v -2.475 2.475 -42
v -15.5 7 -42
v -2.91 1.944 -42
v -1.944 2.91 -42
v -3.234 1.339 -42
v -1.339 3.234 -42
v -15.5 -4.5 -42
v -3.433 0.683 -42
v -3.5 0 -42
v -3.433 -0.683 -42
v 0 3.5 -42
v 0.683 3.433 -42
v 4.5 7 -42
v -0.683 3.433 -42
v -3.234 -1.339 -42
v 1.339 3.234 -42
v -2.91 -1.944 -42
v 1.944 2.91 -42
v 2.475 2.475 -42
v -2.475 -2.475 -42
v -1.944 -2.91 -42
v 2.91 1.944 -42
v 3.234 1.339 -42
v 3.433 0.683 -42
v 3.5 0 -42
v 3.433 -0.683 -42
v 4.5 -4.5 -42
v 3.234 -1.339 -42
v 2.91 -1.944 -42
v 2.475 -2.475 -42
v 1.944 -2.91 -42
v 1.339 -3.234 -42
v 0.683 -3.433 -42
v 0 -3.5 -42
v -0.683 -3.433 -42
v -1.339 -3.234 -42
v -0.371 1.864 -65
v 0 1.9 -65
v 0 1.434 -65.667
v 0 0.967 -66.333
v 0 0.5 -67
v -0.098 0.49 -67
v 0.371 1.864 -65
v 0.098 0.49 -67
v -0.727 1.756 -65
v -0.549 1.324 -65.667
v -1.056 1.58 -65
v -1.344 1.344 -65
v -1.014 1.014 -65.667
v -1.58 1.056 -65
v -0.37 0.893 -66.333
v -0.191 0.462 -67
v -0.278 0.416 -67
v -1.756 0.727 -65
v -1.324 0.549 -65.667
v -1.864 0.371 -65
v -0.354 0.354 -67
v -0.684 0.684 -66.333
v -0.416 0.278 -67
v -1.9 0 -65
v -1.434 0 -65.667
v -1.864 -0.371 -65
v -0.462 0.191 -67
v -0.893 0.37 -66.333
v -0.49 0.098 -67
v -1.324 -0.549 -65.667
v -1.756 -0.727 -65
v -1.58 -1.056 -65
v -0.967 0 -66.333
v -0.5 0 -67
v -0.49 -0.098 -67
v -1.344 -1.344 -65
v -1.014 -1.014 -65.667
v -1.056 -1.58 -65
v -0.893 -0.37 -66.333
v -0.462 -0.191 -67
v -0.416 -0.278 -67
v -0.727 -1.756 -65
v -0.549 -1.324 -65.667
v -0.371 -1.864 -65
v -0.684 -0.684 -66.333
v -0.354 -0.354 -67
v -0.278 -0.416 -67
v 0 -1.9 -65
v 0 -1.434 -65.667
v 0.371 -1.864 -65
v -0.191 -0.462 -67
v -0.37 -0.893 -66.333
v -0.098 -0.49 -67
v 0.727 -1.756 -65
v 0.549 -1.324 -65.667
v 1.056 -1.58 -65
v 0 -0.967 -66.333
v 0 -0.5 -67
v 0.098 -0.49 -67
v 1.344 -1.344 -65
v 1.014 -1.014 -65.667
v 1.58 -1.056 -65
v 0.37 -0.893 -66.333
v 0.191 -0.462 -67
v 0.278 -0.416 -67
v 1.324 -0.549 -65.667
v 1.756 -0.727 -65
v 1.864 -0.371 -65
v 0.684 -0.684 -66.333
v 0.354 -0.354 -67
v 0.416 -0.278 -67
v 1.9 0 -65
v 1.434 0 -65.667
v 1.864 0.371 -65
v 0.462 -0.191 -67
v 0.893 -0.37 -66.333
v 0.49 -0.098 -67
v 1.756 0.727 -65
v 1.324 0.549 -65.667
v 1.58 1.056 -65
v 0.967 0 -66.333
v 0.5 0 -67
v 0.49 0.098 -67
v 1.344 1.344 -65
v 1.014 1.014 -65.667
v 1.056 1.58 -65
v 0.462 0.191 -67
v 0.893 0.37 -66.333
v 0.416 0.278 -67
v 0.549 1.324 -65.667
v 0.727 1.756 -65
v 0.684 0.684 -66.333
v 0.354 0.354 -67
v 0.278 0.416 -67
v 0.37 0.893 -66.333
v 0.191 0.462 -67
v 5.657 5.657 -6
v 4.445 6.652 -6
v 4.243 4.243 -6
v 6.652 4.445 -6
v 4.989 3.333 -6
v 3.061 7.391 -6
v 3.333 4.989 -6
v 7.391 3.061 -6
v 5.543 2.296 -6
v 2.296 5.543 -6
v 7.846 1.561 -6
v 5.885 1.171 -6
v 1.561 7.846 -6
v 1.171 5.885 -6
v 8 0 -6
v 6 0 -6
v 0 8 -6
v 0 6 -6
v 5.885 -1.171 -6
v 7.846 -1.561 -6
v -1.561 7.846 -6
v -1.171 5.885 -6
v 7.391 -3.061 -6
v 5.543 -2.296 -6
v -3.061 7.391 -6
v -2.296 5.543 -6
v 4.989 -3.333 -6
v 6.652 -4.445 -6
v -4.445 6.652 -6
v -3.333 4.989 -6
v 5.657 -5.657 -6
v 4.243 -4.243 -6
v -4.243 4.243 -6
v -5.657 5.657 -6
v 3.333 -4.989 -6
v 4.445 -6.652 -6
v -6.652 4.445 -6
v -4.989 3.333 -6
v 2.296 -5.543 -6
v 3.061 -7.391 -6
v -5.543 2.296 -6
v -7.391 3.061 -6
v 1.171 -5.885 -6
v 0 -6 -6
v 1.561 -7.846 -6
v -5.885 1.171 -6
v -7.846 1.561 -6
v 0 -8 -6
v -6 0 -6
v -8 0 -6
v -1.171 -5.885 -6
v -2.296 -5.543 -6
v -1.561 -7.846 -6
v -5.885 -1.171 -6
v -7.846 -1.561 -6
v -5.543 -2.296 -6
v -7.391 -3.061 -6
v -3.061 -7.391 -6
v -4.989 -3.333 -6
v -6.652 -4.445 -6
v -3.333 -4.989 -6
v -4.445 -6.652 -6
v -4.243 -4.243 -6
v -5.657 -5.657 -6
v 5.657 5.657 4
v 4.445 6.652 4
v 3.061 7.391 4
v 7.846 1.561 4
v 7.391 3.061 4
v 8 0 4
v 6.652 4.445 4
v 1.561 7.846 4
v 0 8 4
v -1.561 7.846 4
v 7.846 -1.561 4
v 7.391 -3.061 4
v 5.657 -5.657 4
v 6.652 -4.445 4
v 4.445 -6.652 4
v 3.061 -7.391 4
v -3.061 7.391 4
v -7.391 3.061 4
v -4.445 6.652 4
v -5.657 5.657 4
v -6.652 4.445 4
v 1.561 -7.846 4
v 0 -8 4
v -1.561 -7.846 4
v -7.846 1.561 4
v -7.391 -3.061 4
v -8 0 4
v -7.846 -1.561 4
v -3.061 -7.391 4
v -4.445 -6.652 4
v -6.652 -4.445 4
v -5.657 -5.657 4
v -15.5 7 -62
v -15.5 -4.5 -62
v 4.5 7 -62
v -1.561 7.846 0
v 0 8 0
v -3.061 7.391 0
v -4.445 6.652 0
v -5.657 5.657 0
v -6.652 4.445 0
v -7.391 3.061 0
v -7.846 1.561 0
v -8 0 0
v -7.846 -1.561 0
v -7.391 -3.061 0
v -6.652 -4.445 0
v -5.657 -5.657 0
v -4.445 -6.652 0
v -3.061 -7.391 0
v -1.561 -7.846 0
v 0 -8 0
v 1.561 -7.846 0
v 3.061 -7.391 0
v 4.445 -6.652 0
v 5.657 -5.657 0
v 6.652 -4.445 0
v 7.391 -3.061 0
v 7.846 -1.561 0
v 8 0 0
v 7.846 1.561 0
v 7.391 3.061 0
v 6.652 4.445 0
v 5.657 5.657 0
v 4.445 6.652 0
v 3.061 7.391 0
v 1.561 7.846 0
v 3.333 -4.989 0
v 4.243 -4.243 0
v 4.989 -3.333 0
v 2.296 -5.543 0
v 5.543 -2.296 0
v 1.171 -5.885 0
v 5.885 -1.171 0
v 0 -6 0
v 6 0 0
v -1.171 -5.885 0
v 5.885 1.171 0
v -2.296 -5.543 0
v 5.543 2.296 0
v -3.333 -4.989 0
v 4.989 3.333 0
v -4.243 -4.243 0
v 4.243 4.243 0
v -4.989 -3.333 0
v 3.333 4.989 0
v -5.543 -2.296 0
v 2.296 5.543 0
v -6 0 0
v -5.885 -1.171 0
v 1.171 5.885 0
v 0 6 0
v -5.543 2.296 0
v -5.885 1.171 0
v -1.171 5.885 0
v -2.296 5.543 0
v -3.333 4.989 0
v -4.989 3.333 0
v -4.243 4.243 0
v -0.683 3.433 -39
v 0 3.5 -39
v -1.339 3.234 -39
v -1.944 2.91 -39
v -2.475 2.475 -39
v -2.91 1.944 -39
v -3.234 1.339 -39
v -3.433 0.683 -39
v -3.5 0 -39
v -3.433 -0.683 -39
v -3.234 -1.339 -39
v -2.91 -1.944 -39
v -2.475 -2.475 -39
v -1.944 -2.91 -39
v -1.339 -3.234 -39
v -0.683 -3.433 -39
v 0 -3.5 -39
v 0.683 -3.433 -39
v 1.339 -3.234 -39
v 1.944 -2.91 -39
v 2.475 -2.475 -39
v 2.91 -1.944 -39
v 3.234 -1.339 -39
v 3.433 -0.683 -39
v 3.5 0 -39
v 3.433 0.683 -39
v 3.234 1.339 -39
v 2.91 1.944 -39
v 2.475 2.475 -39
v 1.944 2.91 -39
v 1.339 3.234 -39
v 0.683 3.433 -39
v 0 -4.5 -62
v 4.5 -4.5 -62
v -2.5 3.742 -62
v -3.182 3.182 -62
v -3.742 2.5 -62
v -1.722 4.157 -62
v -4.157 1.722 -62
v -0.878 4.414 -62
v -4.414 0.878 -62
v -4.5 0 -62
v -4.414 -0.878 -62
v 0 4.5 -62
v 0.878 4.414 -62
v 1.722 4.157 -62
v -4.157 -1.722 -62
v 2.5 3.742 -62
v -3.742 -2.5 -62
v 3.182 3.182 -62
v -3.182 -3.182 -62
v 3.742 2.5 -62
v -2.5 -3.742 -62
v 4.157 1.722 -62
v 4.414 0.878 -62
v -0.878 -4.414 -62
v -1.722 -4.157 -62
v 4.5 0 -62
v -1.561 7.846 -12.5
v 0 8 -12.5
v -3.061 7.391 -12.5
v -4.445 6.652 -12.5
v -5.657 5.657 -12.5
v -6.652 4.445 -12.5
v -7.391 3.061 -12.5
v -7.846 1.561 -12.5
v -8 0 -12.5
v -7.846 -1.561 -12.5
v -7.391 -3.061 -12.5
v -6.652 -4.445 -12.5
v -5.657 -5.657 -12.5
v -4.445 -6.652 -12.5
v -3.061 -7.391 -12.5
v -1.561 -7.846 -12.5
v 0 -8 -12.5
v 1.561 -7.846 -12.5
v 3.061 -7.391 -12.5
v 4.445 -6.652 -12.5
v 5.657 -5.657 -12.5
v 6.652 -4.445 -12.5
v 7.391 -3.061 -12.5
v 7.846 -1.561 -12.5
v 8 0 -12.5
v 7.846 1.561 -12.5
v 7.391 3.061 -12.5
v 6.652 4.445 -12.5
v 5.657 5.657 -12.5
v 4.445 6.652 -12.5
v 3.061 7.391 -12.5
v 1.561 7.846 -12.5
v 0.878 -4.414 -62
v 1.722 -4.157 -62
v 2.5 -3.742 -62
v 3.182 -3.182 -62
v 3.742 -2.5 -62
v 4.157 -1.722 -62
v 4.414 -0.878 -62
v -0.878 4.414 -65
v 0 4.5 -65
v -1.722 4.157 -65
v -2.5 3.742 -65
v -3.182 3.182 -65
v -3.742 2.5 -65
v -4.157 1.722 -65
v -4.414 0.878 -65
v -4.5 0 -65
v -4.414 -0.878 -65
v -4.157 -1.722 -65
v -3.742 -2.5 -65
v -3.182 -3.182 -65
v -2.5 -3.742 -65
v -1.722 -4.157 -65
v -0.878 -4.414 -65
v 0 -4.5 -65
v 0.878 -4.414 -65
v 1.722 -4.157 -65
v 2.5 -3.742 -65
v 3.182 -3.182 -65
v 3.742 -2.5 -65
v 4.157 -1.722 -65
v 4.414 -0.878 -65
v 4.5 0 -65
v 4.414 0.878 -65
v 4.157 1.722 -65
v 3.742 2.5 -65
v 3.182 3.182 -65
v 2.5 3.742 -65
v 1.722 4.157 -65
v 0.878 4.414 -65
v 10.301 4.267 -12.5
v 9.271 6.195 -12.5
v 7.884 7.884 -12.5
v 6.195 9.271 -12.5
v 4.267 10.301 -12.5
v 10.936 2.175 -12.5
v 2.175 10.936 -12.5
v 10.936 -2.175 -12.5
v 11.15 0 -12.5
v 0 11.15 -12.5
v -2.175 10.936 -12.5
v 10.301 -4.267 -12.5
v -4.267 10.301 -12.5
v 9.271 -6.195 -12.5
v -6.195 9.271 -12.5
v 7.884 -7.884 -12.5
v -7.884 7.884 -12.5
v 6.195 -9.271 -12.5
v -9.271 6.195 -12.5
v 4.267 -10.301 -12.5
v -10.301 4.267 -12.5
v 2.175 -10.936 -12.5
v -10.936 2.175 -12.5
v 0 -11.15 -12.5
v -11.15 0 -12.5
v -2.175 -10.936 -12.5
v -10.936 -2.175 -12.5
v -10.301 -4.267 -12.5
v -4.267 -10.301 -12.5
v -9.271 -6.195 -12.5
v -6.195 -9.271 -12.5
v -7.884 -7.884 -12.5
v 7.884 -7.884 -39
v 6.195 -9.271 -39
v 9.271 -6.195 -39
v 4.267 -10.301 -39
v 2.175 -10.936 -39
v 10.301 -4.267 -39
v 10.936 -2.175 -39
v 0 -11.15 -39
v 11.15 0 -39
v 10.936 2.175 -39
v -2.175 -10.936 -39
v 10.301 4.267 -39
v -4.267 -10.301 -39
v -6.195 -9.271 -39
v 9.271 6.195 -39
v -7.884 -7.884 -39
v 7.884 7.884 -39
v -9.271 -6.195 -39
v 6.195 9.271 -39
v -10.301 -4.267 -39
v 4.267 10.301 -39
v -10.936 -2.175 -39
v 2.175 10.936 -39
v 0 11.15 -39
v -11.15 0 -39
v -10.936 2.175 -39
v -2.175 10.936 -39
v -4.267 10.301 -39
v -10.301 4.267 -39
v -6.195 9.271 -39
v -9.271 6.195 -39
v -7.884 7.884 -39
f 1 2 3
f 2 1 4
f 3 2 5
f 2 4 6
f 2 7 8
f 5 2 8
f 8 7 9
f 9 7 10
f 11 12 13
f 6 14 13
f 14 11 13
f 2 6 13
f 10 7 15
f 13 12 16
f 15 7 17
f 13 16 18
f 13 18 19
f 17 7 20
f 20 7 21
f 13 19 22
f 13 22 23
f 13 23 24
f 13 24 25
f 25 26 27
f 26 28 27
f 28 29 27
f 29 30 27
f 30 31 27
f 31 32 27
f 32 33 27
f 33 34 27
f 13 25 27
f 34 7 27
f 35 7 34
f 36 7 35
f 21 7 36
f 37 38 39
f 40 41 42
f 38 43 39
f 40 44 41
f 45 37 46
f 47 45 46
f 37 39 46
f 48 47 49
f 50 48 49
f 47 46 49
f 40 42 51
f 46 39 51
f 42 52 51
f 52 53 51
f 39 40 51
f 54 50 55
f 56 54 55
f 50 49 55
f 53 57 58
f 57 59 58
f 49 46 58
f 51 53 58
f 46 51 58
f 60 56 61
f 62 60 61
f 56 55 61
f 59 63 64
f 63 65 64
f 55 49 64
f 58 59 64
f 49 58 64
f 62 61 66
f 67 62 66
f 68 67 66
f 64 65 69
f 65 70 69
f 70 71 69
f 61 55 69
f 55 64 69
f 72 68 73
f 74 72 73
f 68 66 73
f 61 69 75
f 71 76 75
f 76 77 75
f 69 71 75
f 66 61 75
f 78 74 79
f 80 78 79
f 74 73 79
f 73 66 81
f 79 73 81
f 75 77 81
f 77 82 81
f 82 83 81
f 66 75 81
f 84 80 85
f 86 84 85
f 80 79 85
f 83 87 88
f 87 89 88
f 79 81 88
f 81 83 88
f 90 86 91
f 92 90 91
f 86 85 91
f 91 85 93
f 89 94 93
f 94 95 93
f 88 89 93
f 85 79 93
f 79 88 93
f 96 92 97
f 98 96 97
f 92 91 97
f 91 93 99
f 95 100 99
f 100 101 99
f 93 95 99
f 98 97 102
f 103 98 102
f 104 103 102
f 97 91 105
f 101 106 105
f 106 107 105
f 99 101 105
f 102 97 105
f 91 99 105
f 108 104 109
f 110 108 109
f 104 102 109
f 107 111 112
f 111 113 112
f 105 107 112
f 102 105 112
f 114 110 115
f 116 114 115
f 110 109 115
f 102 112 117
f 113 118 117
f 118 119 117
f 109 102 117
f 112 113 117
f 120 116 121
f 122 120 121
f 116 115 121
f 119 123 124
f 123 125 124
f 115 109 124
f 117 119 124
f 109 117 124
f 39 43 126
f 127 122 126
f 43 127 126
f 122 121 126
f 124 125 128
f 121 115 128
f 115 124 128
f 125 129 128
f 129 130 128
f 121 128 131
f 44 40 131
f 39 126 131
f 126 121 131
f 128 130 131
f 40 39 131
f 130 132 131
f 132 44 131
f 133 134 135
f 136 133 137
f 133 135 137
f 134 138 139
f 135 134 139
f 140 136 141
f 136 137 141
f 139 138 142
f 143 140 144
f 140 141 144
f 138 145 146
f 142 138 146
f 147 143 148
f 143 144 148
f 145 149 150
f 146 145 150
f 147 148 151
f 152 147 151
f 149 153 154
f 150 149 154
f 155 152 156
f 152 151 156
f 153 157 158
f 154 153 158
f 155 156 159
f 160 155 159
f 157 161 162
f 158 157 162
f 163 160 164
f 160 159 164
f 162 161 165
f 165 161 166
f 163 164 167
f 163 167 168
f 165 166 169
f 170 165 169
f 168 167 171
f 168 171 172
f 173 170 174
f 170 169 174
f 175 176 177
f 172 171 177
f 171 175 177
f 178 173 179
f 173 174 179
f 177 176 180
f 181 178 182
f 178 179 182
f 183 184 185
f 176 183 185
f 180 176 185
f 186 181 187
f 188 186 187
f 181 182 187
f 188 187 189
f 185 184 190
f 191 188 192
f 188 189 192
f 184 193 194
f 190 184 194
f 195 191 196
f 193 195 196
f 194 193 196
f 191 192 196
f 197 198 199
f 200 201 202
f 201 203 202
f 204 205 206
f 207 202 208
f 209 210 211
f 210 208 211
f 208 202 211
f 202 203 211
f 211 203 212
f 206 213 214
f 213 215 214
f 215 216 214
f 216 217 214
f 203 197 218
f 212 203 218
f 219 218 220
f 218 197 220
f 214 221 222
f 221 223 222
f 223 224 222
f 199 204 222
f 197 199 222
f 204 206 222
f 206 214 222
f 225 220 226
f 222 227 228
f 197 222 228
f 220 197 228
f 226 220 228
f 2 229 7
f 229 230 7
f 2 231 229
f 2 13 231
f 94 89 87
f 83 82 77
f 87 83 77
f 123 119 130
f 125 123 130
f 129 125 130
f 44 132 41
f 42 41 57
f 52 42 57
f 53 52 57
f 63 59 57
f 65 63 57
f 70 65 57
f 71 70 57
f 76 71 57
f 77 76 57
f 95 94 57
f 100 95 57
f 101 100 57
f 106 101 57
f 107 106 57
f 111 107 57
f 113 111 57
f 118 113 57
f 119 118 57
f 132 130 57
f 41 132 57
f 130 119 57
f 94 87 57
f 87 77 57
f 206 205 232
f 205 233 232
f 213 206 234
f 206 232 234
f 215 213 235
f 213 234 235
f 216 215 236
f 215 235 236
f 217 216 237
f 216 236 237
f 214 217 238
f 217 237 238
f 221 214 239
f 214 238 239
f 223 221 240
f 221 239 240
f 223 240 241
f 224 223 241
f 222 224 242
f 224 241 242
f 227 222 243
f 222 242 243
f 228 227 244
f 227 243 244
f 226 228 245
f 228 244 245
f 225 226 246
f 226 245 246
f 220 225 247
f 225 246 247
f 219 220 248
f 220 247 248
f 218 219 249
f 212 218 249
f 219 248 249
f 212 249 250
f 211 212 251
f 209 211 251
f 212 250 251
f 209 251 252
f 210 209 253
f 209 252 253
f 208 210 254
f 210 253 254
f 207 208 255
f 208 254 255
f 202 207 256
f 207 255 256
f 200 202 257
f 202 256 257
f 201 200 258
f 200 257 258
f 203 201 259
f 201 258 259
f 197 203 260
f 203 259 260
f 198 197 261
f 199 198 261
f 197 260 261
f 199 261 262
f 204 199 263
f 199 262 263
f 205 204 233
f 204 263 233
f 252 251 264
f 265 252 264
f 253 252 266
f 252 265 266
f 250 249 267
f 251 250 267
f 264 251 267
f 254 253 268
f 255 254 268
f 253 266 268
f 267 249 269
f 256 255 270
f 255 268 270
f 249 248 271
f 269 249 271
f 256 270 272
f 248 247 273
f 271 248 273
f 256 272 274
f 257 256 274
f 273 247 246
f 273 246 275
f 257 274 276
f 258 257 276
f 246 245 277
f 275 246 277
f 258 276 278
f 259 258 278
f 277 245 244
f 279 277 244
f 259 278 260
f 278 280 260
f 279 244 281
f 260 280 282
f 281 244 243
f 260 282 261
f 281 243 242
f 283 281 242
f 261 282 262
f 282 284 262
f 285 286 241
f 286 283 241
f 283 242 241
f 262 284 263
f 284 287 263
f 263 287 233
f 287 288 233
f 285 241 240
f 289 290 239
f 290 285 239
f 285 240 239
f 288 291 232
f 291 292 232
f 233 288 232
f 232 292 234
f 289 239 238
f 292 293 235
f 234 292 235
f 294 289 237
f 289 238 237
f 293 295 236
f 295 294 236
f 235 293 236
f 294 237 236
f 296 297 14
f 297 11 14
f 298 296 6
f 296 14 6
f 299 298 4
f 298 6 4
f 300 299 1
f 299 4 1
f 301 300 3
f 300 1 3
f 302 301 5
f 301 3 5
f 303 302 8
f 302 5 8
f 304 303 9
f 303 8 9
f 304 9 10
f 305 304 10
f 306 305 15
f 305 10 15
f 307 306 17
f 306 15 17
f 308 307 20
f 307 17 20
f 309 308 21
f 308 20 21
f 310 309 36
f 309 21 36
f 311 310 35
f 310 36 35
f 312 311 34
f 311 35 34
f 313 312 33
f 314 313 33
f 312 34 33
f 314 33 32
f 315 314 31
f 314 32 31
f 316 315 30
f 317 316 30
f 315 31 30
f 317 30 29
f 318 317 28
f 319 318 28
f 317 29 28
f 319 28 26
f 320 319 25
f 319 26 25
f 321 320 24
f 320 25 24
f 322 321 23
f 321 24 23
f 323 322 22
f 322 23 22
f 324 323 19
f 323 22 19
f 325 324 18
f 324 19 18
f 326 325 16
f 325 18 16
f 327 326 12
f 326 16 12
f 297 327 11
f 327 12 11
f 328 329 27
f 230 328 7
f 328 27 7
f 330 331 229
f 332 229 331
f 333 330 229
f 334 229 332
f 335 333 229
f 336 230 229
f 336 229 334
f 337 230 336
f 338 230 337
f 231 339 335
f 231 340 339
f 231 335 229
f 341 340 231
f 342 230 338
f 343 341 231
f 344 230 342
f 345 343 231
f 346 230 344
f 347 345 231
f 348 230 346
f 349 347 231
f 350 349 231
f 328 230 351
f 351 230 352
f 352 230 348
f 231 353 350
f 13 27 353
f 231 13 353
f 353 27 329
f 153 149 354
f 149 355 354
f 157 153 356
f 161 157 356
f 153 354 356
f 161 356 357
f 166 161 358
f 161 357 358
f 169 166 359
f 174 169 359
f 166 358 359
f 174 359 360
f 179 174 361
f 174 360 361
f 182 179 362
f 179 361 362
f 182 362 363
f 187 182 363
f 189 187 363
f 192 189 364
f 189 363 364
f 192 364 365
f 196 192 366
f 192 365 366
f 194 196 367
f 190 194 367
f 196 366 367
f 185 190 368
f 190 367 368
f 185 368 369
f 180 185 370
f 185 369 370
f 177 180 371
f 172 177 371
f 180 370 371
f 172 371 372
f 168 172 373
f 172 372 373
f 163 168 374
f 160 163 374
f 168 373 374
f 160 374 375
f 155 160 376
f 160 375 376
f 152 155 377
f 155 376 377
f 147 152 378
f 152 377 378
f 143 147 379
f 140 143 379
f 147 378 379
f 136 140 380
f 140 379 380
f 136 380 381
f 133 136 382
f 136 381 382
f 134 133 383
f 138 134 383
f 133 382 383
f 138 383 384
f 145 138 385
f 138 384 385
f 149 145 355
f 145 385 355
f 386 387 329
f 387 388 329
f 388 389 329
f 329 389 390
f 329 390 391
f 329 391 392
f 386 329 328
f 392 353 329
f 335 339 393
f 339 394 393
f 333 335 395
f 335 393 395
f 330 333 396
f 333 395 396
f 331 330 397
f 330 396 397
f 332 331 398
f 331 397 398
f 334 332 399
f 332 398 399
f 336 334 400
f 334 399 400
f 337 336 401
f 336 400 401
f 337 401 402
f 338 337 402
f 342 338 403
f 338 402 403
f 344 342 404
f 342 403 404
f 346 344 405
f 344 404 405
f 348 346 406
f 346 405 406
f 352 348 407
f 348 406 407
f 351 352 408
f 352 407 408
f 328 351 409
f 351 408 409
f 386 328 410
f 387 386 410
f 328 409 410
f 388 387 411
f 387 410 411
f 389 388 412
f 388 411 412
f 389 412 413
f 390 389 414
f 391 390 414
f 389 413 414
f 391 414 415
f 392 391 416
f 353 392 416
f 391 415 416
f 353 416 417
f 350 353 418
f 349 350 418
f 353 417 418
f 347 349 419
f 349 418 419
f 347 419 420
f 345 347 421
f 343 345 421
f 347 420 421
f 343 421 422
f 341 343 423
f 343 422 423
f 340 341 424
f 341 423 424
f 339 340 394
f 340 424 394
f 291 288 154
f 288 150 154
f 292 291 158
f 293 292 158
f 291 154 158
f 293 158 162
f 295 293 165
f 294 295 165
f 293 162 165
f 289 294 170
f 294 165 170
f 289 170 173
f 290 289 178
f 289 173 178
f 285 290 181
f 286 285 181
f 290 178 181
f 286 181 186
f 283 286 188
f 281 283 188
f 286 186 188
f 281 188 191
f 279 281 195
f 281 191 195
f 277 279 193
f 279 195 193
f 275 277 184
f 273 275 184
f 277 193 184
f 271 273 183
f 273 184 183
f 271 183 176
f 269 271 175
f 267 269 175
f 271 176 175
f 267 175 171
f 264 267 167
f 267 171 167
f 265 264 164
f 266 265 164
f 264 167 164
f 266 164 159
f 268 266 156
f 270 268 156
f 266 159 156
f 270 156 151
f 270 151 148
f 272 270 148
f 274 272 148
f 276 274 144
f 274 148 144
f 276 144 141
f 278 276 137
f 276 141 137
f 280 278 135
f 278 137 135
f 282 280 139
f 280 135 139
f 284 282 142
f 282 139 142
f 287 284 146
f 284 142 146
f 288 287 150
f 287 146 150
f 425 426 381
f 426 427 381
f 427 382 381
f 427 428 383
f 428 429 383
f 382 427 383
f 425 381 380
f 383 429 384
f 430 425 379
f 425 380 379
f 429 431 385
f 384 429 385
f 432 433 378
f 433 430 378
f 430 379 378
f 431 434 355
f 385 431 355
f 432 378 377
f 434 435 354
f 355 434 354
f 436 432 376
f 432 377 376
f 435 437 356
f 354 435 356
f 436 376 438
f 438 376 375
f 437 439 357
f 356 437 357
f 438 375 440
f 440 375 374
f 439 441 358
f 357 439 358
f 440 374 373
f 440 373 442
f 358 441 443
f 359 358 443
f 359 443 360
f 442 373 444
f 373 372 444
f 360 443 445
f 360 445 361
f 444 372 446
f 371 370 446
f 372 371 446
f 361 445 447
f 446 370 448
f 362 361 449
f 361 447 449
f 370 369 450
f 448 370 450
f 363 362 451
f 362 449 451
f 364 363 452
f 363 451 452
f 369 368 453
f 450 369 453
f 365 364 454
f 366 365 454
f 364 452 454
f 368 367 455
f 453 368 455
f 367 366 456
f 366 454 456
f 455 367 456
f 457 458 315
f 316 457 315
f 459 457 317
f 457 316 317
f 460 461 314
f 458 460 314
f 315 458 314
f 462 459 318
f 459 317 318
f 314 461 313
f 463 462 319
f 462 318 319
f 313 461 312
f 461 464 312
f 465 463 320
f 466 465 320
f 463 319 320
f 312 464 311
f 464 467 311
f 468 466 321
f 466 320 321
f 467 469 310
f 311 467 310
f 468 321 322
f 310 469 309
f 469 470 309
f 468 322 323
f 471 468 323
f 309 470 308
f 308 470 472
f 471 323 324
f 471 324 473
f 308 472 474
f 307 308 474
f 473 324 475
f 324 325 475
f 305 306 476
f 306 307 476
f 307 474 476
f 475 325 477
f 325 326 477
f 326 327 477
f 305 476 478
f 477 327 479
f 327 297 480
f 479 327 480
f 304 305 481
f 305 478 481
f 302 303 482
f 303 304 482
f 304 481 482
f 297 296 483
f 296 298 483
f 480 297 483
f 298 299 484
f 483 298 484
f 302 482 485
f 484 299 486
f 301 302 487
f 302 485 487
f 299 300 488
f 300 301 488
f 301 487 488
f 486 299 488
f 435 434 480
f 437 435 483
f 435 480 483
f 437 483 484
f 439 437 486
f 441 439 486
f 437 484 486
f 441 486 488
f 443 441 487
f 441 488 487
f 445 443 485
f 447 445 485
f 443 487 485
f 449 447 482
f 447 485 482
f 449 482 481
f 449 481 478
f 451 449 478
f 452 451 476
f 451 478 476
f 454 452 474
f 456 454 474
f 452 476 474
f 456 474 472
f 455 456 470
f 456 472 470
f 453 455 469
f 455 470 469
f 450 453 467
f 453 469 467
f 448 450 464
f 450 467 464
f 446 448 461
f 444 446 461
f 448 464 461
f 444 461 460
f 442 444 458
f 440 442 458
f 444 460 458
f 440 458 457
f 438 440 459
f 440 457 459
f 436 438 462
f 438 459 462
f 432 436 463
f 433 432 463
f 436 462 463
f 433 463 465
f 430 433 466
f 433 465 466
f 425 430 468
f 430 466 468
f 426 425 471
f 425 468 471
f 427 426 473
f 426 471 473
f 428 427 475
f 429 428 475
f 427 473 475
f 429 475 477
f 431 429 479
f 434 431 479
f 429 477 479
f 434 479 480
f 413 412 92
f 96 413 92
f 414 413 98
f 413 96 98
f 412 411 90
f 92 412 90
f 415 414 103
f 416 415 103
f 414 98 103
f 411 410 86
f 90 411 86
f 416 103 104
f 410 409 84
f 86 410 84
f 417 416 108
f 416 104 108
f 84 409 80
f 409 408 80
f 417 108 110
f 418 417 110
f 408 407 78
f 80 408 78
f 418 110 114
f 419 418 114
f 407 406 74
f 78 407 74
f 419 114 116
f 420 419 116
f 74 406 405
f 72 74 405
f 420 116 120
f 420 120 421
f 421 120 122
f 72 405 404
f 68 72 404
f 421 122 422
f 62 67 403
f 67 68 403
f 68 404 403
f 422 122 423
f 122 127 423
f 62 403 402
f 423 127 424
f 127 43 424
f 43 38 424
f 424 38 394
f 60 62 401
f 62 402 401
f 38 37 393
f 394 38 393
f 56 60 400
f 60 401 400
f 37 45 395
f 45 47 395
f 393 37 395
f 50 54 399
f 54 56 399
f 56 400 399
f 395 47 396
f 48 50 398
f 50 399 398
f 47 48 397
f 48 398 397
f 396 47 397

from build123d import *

# Parameters (mm, degrees)
PAD006_DEPTH = 4.5
PAD007_DEPTH = 7


with BuildPart() as part:
    # Sketch015 → Revolution (revolve)
    with BuildSketch(Plane.YZ):
        Polygon((0, 4), (8, 4), (8, 0), (6, 0), (6, -6), (8, -6), (8, -12.5), (11.15, -12.5), (11.15, -39), (3.5, -39), (3.5, -62), (4.5, -62), (4.5, -65), (1.9004150762, -65), (0.5, -67), (0, -67), align=None)
    revolve(axis=Axis((0, 0, 0), (0, 0, 1)))

    # Sketch016 → Pad006 (new body)
    with BuildSketch(Plane.XZ):
        Polygon((-3.5, -62), (-15.5, -62), (-15.5, -42), (4.5, -42), (4.5, -62), (3.5, -62), align=None)
    extrude(amount=PAD006_DEPTH)

    # Sketch016 → Pad007 (join)
    with BuildSketch(Plane.XZ):
        Polygon((-3.5, -62), (-15.5, -62), (-15.5, -42), (4.5, -42), (4.5, -62), (3.5, -62), align=None)
    extrude(amount=-PAD007_DEPTH)


solid = part.part
